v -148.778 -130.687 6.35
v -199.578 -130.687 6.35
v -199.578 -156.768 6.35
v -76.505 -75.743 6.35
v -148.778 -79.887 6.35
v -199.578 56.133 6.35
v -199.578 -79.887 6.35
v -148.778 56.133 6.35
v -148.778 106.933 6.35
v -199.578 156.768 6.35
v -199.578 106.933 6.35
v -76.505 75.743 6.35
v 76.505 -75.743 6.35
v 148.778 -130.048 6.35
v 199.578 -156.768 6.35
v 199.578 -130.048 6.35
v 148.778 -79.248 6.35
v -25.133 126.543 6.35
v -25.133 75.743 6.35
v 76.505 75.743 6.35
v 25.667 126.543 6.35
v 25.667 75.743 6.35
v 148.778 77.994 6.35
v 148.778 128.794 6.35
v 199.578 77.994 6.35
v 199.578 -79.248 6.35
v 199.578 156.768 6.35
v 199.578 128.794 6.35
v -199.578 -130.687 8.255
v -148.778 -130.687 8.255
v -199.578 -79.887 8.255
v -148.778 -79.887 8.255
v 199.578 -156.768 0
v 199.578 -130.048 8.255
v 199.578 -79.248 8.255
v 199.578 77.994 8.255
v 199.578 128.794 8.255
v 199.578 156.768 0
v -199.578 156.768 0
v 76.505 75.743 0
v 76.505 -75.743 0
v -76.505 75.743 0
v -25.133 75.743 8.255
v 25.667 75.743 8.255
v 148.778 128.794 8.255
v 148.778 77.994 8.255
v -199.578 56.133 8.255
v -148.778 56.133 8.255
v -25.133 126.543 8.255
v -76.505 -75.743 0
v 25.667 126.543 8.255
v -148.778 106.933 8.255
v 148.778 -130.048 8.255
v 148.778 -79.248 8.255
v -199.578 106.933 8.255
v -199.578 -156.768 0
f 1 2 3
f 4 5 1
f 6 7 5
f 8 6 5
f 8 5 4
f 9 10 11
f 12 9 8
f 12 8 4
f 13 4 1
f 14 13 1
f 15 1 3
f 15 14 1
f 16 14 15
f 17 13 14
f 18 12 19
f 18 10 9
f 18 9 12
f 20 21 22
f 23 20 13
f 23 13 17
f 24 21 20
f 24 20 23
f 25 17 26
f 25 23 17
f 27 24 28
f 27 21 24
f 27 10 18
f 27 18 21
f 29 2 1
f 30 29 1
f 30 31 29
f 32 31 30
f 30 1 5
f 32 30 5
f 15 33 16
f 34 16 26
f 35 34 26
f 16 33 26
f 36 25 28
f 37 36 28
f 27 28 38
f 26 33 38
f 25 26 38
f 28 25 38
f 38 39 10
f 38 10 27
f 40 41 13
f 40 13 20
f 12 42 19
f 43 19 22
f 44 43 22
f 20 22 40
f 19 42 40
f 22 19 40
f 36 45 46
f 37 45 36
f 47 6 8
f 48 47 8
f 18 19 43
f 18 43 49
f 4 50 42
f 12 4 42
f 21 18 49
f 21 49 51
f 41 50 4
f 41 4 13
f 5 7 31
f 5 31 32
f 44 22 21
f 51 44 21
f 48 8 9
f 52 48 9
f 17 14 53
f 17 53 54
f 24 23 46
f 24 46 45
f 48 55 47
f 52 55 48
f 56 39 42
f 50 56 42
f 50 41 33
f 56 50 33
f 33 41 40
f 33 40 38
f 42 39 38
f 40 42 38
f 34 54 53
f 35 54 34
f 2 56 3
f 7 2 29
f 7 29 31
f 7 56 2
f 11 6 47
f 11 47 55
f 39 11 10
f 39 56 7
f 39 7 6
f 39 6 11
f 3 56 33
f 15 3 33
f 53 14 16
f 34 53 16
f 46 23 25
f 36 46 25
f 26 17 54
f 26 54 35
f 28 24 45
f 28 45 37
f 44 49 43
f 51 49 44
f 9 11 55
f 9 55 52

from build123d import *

# Parameters (mm, degrees)
F0_W     = 399.155342
F0_H     = 313.535798
F0_W_2   = 153.0096
F0_H_2   = 151.4856
F1_DEPTH = 6.35
F2_W     = 50.8
F2_H     = 50.8
F3_DEPTH = 1.905


with BuildPart() as f1:
    # F0 (on Top) → F1 (new body)
    with BuildSketch(Plane.XY):
        Rectangle(F0_W, F0_H)
        Rectangle(F0_W_2, F0_H_2, mode=Mode.SUBTRACT)
    extrude(amount=F1_DEPTH)

    # F2 (on face) → F3 (join)
    with BuildSketch(Plane.XY.offset(6.35)):
        with Locations((-174.177671, -105.287043)):
            Rectangle(F2_W, F2_H)
        with Locations((-174.177671, 81.533401)):
            Rectangle(F2_W, F2_H)
        with Locations((0.267005, 101.1428)):
            Rectangle(F2_W, F2_H)
        with Locations((174.177671, 103.394294)):
            Rectangle(F2_W, F2_H)
        with Locations((174.177671, -104.648051)):
            Rectangle(F2_W, F2_H)
    extrude(amount=F3_DEPTH)


solid = f1.part
